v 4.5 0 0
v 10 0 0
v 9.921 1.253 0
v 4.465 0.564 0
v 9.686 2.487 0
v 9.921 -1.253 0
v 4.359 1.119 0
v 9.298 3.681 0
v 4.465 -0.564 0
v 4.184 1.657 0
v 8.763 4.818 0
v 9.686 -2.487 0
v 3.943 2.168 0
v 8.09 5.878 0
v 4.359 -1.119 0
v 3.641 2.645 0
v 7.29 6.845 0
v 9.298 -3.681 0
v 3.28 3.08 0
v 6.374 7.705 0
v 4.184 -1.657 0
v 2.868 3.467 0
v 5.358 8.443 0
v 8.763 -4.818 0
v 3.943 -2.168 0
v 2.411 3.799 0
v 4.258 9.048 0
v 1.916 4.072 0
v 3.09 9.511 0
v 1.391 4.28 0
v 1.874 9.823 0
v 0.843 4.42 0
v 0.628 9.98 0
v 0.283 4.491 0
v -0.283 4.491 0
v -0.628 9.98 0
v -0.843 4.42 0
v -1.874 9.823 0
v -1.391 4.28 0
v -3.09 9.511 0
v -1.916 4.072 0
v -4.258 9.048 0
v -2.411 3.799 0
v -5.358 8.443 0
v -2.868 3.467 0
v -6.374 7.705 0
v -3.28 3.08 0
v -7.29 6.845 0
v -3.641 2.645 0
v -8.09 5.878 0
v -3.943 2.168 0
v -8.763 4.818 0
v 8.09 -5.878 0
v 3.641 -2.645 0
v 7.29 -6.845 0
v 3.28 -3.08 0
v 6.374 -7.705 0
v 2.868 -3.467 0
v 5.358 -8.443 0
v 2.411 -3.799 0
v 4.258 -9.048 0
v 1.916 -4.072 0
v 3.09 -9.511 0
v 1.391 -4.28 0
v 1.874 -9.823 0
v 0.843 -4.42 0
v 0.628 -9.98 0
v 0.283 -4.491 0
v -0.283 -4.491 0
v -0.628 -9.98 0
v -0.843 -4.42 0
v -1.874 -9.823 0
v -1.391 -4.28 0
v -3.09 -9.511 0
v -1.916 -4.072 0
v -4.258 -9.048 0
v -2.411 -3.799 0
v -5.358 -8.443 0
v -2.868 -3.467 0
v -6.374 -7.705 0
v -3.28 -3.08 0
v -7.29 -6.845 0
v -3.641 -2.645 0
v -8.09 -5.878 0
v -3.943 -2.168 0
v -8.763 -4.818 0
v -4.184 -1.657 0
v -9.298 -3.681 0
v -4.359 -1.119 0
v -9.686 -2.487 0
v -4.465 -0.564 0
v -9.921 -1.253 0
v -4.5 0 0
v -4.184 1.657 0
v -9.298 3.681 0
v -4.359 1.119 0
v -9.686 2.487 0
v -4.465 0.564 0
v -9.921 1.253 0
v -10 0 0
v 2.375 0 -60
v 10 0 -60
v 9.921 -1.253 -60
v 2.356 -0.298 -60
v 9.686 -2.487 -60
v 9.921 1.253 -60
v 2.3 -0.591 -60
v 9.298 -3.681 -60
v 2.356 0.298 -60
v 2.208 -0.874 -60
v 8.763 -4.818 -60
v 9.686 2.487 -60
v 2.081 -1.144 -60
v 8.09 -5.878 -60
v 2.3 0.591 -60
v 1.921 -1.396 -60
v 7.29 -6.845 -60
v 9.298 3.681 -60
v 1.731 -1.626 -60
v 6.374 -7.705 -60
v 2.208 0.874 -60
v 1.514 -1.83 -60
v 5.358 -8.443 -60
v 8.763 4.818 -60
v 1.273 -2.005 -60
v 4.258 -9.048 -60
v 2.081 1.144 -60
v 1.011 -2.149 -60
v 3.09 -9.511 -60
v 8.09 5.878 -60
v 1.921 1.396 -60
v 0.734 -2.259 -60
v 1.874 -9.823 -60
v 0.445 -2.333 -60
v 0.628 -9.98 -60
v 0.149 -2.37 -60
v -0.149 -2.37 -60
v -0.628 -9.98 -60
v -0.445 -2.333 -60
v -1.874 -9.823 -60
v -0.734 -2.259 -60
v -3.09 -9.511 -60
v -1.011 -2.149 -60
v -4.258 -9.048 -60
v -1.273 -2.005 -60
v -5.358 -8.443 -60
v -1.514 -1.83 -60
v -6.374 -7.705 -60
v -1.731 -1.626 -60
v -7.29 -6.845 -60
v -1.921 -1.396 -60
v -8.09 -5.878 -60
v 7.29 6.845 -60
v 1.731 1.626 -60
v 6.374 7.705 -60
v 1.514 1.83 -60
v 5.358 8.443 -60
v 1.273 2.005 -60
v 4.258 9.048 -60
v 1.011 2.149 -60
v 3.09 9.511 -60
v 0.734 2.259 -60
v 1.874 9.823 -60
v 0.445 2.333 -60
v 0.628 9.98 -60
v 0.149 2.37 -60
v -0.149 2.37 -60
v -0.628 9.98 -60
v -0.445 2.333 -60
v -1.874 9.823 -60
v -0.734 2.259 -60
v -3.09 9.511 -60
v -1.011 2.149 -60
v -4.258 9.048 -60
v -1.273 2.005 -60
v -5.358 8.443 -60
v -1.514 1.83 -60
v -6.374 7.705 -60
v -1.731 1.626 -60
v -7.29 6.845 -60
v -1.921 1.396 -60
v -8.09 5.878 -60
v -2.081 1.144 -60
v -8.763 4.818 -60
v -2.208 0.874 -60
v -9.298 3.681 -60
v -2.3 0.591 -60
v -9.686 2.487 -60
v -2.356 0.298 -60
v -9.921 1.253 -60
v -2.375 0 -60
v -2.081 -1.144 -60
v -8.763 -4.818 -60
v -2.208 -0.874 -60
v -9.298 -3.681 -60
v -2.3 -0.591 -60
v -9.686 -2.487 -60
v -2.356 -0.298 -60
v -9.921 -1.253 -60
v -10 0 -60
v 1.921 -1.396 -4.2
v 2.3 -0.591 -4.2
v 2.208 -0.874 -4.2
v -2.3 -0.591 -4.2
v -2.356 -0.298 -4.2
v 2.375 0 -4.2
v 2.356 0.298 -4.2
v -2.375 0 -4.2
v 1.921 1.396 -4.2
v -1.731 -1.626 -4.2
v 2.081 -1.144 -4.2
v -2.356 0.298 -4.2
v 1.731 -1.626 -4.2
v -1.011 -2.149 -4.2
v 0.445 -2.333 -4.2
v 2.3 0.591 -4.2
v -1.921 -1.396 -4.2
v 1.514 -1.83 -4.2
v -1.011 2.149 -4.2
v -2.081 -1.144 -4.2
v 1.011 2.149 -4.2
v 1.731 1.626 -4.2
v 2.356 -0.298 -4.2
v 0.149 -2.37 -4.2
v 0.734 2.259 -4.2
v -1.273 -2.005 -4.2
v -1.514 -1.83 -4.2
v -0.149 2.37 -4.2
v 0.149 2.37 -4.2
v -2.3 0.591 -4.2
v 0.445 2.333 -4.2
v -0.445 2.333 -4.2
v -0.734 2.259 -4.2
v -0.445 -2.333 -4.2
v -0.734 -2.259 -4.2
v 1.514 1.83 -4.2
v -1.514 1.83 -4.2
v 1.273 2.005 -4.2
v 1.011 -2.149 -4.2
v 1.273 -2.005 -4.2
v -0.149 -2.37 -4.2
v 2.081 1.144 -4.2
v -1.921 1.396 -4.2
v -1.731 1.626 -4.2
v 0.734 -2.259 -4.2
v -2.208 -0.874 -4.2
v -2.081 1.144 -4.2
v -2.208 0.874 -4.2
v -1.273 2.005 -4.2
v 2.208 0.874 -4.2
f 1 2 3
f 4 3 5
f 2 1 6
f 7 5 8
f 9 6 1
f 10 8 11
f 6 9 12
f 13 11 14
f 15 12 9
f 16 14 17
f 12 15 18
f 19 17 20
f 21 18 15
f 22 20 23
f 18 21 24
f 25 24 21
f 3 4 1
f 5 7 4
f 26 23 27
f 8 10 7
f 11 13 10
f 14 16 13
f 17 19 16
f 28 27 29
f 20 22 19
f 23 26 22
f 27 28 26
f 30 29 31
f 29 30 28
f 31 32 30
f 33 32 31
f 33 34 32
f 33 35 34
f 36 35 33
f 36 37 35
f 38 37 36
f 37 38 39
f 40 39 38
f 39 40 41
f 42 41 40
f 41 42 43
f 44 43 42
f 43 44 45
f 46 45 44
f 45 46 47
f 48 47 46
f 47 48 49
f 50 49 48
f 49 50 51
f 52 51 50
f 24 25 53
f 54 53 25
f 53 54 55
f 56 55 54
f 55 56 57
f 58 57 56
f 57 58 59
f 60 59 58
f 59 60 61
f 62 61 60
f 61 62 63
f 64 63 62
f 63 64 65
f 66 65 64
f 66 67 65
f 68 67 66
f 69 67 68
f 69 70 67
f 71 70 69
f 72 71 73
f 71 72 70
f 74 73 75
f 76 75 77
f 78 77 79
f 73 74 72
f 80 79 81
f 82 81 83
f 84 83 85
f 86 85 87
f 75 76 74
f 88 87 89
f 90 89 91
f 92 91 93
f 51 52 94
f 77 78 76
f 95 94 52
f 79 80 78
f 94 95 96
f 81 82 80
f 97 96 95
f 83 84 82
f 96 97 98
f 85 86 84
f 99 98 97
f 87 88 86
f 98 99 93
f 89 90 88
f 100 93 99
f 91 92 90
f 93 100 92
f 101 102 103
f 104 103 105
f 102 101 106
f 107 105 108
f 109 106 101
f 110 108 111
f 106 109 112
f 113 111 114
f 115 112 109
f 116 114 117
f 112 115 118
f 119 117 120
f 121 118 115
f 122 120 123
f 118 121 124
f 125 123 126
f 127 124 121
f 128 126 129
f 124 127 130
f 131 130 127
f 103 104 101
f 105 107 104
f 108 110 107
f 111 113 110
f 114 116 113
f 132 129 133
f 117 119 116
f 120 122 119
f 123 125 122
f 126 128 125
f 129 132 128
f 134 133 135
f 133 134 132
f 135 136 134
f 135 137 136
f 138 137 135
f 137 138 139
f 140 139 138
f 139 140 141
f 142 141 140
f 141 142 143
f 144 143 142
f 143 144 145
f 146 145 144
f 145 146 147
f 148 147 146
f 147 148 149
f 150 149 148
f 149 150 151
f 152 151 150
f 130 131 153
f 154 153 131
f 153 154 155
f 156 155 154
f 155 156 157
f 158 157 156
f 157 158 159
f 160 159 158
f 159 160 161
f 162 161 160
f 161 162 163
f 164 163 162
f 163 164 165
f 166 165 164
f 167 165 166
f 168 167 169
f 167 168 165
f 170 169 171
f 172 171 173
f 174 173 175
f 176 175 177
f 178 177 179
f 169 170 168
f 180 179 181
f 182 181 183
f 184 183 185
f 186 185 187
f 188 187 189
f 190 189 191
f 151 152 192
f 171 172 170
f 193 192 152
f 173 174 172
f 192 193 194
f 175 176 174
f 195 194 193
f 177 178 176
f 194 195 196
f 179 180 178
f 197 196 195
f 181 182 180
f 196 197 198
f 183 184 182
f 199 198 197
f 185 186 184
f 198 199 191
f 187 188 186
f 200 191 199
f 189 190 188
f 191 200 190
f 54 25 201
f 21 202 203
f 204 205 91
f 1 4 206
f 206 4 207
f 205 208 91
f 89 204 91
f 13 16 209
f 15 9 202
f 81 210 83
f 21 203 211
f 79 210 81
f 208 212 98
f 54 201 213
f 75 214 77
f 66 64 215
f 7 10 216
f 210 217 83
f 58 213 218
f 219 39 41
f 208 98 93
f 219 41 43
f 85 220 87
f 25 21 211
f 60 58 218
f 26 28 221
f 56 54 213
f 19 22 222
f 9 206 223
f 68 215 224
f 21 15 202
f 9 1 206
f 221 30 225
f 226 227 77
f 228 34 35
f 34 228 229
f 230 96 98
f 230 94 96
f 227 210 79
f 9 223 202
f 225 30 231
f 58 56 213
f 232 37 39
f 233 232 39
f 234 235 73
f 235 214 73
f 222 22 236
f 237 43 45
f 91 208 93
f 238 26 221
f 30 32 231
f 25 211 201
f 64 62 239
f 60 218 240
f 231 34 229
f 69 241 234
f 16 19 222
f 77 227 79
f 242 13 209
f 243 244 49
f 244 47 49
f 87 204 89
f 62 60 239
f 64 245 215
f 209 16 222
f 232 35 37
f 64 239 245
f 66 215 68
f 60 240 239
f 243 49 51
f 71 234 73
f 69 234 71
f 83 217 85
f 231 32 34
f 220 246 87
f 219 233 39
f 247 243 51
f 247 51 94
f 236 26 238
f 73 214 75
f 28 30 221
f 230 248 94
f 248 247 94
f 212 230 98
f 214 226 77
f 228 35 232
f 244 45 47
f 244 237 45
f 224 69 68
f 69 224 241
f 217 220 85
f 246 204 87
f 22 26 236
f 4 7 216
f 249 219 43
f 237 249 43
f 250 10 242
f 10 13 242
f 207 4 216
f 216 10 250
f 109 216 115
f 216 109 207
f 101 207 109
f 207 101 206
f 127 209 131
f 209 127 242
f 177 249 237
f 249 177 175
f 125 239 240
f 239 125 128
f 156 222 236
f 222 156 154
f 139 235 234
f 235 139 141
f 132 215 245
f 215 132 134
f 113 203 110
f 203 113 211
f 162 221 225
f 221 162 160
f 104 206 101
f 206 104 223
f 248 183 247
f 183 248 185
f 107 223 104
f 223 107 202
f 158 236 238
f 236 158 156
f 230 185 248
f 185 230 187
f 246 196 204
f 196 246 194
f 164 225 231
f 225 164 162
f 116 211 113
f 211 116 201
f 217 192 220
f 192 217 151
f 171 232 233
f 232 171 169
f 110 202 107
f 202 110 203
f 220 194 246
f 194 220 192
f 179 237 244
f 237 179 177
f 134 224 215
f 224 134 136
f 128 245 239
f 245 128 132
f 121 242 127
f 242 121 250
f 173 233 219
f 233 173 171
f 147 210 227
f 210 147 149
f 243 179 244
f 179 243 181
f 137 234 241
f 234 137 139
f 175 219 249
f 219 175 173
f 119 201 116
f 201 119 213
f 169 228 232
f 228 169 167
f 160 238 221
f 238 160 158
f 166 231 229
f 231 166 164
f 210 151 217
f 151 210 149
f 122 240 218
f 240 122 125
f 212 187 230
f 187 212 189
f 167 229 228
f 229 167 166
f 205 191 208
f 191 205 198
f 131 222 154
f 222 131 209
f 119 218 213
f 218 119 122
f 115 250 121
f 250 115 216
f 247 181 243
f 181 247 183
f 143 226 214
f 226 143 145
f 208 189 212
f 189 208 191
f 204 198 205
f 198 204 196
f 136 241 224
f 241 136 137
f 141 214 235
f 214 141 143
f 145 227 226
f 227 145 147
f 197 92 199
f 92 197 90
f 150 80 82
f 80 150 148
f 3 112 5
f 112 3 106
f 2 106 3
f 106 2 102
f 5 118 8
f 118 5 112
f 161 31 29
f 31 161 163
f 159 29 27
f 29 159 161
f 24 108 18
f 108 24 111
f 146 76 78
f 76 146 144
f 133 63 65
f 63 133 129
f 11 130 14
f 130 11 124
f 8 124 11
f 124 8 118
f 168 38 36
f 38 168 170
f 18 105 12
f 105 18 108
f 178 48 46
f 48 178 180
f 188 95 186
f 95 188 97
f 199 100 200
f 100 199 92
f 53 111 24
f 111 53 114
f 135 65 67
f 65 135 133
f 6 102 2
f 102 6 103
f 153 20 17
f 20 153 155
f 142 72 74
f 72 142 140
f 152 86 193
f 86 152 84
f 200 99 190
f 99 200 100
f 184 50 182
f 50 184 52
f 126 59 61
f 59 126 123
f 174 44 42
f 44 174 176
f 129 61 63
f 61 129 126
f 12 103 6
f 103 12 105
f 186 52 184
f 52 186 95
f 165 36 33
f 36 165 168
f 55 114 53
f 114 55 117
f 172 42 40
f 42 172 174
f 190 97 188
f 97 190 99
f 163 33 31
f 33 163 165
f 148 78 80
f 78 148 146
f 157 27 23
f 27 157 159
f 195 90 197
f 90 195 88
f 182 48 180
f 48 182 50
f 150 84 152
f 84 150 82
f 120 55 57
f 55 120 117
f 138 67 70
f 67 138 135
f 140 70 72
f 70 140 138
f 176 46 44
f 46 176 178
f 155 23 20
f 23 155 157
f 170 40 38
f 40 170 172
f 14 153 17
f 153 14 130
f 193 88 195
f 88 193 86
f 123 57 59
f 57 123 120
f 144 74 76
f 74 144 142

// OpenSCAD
$fn = 50;


difference() {
	union() {
		translate(v = [0, 0, -60.0000000000]) {
			cylinder(h = 60, r = 10.0000000000);
		}
	}
	union() {
		translate(v = [0, 0, 0]) {
			rotate(a = [0, 0, 0]) {
				difference() {
					union() {
						#translate(v = [0, 0, -60.0000000000]) {
							cylinder(h = 60, r = 2.2500000000);
						}
						#translate(v = [0, 0, -4.2000000000]) {
							cylinder(h = 4.2000000000, r = 10.0000000000, r1 = 2.3750000000, r2 = 4.5000000000);
						}
						#translate(v = [0, 0, -60.0000000000]) {
							cylinder(h = 60, r = 2.3750000000);
						}
						#translate(v = [0, 0, -60.0000000000]) {
							cylinder(h = 60, r = 2.2500000000);
						}
					}
					union();
				}
			}
		}
	}
}
